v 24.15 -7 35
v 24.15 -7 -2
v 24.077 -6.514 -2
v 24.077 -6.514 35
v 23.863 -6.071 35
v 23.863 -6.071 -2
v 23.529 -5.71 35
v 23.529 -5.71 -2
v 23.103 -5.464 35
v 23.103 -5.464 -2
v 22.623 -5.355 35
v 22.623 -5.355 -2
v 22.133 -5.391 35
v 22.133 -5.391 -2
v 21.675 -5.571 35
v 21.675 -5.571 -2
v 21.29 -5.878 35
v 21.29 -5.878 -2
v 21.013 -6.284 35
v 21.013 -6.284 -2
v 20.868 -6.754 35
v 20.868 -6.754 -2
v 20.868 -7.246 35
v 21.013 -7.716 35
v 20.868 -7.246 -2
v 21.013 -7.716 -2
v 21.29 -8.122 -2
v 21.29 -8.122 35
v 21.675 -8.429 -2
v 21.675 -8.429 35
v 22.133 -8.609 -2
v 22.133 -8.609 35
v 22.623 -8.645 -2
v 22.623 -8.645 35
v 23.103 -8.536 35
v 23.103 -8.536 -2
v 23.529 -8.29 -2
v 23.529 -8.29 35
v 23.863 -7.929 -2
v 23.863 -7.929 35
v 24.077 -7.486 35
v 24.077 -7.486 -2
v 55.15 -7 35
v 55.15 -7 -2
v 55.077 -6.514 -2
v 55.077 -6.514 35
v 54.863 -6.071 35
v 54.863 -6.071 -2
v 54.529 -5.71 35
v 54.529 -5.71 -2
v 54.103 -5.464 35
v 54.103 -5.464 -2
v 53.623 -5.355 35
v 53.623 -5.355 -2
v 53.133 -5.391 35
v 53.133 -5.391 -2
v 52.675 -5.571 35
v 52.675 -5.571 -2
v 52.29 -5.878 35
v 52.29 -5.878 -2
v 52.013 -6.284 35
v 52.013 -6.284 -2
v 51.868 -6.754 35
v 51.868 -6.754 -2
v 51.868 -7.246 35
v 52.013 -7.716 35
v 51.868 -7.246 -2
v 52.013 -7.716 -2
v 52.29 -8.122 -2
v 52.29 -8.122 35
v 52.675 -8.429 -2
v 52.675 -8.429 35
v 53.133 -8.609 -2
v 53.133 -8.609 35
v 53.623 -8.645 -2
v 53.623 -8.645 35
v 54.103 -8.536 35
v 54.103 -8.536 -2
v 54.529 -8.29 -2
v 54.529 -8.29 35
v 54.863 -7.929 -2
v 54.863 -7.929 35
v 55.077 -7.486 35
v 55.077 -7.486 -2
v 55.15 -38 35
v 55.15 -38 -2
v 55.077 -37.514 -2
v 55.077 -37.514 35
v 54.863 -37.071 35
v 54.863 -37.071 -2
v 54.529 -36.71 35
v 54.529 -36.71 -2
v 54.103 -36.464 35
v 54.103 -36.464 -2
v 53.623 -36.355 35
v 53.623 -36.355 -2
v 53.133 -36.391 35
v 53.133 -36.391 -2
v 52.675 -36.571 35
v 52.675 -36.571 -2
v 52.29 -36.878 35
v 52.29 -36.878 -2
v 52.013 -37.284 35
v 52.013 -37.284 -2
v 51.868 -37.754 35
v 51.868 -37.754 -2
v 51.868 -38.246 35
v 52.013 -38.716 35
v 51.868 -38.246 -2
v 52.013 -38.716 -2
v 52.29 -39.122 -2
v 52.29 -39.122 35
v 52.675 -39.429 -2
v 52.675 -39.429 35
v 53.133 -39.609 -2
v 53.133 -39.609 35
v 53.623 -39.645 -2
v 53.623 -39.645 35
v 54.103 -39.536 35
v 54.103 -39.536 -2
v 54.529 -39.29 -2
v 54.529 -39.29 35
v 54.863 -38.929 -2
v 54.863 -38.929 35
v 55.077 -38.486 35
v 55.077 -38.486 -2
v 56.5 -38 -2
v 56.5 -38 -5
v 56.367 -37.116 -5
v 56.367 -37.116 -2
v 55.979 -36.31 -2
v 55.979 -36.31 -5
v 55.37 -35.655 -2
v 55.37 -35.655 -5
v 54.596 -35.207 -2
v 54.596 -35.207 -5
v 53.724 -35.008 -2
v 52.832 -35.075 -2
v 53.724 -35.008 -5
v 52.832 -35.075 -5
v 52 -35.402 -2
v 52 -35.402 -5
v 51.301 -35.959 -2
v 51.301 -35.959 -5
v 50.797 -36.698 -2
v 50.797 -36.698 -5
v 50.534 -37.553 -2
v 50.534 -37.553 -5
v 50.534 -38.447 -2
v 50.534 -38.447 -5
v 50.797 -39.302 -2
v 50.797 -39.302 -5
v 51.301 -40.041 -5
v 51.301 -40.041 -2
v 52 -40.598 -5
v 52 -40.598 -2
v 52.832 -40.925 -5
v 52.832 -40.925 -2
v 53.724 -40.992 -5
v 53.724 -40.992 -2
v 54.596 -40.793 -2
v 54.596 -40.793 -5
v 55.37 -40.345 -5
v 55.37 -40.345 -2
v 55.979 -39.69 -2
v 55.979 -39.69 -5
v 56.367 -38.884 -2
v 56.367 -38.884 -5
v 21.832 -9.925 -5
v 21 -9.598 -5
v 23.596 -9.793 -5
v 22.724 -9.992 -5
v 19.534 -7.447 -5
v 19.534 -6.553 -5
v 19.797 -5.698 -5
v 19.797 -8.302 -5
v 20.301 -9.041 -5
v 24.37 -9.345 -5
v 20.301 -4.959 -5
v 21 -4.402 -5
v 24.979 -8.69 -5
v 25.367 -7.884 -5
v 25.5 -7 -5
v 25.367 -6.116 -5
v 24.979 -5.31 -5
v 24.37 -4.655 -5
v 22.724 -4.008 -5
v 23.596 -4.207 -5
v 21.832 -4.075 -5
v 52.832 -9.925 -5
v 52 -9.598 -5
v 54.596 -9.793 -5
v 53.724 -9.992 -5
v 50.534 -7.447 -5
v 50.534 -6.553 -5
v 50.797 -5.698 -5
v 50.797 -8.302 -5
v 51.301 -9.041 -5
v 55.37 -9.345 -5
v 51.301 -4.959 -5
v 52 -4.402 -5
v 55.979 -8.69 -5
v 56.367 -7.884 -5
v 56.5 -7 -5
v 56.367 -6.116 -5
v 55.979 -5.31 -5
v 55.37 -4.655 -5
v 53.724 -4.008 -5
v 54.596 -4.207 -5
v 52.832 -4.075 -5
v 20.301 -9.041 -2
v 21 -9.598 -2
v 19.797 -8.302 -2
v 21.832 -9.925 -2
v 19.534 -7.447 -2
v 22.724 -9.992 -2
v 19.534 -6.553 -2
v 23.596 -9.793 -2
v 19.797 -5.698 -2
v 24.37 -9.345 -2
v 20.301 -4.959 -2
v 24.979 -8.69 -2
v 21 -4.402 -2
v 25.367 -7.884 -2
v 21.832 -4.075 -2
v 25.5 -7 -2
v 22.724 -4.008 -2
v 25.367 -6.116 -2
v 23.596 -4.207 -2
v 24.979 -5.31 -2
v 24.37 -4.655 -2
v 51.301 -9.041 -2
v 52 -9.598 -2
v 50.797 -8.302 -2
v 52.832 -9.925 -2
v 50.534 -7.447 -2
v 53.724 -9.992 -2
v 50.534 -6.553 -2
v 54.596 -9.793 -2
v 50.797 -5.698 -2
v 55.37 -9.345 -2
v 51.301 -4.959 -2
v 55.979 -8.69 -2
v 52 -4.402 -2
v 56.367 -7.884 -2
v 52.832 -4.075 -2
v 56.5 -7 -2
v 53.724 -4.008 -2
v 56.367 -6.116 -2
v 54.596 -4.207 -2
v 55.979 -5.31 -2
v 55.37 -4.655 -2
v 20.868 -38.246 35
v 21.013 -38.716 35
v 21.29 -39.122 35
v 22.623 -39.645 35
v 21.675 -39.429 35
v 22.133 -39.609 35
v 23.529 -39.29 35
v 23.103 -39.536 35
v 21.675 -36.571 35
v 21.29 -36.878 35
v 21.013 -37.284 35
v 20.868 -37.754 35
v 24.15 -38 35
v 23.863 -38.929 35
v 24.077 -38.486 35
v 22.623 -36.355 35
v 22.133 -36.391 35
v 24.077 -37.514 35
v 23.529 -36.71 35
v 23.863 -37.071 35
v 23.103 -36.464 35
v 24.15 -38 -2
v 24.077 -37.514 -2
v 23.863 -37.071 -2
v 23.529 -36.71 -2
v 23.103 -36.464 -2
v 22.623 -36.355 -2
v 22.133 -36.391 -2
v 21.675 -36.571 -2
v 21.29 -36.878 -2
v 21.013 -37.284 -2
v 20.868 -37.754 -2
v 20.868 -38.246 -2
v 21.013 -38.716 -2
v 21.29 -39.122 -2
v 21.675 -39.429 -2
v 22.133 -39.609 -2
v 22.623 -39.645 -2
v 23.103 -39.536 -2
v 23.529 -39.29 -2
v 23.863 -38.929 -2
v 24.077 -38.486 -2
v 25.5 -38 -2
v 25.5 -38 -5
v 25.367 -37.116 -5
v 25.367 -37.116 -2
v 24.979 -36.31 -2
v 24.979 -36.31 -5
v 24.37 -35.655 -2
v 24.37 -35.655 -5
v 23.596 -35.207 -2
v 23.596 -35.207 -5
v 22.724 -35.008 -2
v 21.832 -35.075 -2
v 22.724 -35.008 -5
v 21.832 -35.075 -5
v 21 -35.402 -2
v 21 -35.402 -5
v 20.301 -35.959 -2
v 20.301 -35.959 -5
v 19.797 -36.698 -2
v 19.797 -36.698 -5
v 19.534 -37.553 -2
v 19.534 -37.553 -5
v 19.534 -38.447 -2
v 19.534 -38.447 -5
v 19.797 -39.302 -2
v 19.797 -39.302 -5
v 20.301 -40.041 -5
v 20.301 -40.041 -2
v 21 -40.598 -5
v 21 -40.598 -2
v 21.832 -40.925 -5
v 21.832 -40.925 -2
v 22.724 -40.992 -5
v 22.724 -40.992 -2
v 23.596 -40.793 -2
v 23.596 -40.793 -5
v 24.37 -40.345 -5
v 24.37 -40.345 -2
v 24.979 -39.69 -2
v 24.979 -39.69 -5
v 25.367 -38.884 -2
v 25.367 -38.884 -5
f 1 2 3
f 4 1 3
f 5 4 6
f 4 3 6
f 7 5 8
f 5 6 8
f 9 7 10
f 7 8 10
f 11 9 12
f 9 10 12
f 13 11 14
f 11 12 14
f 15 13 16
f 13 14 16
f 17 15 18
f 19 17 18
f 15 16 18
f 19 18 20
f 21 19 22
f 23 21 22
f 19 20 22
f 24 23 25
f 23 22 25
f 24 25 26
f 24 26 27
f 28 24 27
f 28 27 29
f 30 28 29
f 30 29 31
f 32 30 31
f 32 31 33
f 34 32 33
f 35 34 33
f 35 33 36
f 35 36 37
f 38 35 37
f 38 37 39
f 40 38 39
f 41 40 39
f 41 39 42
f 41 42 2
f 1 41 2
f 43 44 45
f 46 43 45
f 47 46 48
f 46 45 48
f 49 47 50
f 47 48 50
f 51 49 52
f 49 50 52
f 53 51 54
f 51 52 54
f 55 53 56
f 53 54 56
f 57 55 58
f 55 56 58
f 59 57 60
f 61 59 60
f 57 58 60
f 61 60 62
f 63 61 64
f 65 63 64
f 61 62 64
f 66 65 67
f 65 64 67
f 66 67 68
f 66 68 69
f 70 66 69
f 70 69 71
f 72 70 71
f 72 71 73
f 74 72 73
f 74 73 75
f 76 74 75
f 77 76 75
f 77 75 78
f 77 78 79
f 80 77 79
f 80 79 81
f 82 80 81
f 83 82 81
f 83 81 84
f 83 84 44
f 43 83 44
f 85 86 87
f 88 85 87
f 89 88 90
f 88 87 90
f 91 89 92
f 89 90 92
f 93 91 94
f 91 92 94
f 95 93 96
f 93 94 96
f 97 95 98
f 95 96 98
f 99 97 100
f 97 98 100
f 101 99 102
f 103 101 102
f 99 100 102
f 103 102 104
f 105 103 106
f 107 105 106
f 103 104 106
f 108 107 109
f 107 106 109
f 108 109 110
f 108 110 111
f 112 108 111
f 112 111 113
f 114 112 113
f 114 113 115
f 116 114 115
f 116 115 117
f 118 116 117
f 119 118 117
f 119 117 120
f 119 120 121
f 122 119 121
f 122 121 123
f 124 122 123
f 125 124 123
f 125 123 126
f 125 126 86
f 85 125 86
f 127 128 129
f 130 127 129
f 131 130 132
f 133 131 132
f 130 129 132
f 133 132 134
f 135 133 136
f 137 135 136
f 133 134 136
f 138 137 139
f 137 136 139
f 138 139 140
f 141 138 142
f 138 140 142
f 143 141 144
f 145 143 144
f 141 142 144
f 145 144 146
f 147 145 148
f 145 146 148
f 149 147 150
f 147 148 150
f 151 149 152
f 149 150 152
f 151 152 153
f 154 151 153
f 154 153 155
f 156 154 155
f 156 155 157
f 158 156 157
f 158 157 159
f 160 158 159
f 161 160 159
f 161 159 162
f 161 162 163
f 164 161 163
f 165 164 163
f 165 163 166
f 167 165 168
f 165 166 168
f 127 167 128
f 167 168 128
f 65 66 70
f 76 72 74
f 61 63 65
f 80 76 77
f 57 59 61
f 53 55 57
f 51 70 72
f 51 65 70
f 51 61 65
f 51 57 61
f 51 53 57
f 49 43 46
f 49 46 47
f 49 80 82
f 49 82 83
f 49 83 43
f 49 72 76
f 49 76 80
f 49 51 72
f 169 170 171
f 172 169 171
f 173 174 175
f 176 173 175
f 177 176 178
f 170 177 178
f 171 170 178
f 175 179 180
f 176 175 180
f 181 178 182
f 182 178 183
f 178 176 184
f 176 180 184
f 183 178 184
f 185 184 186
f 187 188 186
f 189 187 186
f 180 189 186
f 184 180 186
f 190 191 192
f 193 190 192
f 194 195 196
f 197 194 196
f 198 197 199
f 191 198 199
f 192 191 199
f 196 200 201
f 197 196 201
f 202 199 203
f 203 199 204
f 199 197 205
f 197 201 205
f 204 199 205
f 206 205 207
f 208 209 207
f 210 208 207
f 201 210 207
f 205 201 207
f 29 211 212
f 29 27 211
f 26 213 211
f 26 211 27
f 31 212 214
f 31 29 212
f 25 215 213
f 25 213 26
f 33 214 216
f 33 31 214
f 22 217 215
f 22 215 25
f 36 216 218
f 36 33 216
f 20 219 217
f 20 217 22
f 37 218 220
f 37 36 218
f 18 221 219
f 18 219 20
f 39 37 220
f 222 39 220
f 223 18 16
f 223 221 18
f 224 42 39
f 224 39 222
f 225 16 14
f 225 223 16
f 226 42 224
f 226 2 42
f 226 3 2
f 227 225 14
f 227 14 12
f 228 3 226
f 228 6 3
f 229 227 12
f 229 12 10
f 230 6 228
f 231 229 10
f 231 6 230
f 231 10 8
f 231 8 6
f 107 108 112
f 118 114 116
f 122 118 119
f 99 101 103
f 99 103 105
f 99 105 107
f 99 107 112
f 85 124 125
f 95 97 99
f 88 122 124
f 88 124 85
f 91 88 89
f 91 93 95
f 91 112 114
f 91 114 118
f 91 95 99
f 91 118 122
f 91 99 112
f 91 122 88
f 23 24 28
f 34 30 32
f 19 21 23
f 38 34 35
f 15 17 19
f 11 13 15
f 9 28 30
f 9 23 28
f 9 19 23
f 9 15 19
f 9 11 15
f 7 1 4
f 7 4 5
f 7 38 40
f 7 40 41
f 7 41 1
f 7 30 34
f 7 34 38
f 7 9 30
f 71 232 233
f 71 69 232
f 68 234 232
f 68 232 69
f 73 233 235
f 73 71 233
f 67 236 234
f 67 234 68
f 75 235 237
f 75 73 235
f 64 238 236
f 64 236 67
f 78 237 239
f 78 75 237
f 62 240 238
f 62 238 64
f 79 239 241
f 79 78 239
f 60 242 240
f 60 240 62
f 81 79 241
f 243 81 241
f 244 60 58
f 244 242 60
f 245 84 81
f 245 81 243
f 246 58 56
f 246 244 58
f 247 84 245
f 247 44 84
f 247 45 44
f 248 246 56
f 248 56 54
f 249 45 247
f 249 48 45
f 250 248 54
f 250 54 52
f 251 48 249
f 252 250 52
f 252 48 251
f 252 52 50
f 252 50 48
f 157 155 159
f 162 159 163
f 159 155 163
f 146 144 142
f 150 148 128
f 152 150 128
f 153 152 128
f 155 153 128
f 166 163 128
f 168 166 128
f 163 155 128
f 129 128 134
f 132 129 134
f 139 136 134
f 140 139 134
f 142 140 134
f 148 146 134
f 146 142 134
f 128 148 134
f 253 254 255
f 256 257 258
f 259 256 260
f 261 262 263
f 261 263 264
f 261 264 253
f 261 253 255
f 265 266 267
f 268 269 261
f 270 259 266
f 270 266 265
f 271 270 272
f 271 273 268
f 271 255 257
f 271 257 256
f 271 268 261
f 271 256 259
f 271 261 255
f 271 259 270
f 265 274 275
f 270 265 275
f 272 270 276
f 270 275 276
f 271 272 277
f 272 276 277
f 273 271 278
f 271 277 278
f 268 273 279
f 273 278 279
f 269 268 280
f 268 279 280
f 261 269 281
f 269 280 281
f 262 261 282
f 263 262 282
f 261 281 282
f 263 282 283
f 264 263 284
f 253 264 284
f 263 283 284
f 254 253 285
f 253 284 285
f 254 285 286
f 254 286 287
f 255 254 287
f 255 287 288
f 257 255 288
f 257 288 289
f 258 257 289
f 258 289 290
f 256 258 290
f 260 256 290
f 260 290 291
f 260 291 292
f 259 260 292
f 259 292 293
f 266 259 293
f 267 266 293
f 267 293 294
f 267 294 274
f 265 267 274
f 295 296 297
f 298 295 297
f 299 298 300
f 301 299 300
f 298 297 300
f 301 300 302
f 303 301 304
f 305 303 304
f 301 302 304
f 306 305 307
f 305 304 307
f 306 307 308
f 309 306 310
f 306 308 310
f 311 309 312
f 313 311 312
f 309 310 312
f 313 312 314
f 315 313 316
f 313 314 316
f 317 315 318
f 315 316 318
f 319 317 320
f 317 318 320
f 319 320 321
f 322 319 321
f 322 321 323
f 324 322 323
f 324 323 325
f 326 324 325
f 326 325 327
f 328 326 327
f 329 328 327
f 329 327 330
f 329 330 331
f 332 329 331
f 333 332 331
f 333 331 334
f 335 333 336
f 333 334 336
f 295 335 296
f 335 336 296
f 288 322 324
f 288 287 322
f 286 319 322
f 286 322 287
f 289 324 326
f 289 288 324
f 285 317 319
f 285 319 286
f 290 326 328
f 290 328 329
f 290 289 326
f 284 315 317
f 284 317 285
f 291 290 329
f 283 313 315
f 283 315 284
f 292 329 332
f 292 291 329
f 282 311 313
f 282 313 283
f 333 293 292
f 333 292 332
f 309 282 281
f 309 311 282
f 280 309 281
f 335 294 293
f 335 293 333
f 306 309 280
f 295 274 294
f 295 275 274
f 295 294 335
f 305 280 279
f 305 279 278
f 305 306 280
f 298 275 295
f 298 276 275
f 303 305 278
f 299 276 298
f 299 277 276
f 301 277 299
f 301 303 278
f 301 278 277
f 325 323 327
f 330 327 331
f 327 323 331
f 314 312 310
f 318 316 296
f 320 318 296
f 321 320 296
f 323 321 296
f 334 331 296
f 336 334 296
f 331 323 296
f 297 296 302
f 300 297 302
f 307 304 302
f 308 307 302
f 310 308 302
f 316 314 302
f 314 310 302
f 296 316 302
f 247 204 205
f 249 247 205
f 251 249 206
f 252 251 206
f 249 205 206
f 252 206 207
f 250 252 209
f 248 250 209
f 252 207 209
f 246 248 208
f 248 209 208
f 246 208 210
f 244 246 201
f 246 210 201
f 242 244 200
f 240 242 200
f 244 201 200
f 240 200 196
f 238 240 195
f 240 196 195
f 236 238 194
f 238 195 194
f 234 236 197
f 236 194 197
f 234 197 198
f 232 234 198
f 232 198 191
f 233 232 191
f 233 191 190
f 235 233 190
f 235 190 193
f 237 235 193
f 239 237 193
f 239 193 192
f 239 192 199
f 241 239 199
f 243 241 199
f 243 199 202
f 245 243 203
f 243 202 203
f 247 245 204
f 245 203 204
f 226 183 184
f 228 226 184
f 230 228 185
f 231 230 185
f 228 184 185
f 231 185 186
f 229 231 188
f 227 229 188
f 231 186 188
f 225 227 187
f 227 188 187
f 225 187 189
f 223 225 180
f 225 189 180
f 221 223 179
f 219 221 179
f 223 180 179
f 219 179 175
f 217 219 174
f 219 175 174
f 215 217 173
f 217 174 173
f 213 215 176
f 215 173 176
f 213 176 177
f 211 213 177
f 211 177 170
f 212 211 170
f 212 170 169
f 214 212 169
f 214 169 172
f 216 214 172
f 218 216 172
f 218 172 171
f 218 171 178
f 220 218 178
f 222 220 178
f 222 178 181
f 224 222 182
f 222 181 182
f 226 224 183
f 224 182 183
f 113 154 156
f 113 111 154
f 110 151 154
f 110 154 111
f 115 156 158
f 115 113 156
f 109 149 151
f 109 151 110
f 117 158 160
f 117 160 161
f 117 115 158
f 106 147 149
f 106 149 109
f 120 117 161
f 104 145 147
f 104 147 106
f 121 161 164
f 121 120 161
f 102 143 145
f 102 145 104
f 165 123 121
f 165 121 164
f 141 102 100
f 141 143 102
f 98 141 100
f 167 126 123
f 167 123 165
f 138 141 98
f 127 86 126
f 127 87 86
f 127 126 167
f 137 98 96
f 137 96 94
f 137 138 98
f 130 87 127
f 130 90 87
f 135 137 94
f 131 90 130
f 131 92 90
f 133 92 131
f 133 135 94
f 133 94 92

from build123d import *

# Parameters (mm, degrees)
CYLINDER067_R     = 3
CYLINDER067_DEPTH = 3
CYLINDER066_R     = 3
CYLINDER066_DEPTH = 3
CYLINDER065_R     = 3
CYLINDER065_DEPTH = 3
CYLINDER061_R     = 1.65
CYLINDER061_DEPTH = 40
CYLINDER062_R     = 1.65
CYLINDER062_DEPTH = 40
CYLINDER063_R     = 1.65
CYLINDER063_DEPTH = 40
CYLINDER064_R     = 1.65
CYLINDER064_DEPTH = 40
CYLINDER068_R     = 3
CYLINDER068_DEPTH = 3


with BuildPart() as cylinder067:
    # Cylinder067 → Cylinder067 (new body)
    with BuildSketch(Plane(origin=(22.5, -38, -5), x_dir=(1, 0, 0), z_dir=(0, 0, 1))):
        Circle(CYLINDER067_R)
    extrude(amount=CYLINDER067_DEPTH)


with BuildPart() as cylinder066:
    # Cylinder066 → Cylinder066 (new body)
    with BuildSketch(Plane(origin=(53.5, -7, -5), x_dir=(1, 0, 0), z_dir=(0, 0, 1))):
        Circle(CYLINDER066_R)
    extrude(amount=CYLINDER066_DEPTH)


with BuildPart() as cylinder065:
    # Cylinder065 → Cylinder065 (new body)
    with BuildSketch(Plane(origin=(22.5, -7, -5), x_dir=(1, 0, 0), z_dir=(0, 0, 1))):
        Circle(CYLINDER065_R)
    extrude(amount=CYLINDER065_DEPTH)


with BuildPart() as cylinder061:
    # Cylinder061 → Cylinder061 (new body)
    with BuildSketch(Plane(origin=(22.5, -7, -5), x_dir=(1, 0, 0), z_dir=(0, 0, 1))):
        Circle(CYLINDER061_R)
    extrude(amount=CYLINDER061_DEPTH)


with BuildPart() as cylinder062:
    # Cylinder062 → Cylinder062 (new body)
    with BuildSketch(Plane(origin=(53.5, -7, -5), x_dir=(1, 0, 0), z_dir=(0, 0, 1))):
        Circle(CYLINDER062_R)
    extrude(amount=CYLINDER062_DEPTH)


with BuildPart() as cylinder063:
    # Cylinder063 → Cylinder063 (new body)
    with BuildSketch(Plane(origin=(22.5, -38, -5), x_dir=(1, 0, 0), z_dir=(0, 0, 1))):
        Circle(CYLINDER063_R)
    extrude(amount=CYLINDER063_DEPTH)


with BuildPart() as cylinder064:
    # Cylinder064 → Cylinder064 (new body)
    with BuildSketch(Plane(origin=(53.5, -38, -5), x_dir=(1, 0, 0), z_dir=(0, 0, 1))):
        Circle(CYLINDER064_R)
    extrude(amount=CYLINDER064_DEPTH)


with BuildPart() as motor_bolt:
    # Cylinder068 → Cylinder068 (new body)
    with BuildSketch(Plane(origin=(53.5, -38, -5), x_dir=(1, 0, 0), z_dir=(0, 0, 1))):
        Circle(CYLINDER068_R)
    extrude(amount=CYLINDER068_DEPTH)

    # Fusion006002011004053036004001003009: union Cylinder067, Cylinder066, Cylinder065, Cylinder061, Cylinder062, Cylinder063, Cylinder064
    add(cylinder067.part)
    add(cylinder066.part)
    add(cylinder065.part)
    add(cylinder061.part)
    add(cylinder062.part)
    add(cylinder063.part)
    add(cylinder064.part)


solid = motor_bolt.part
